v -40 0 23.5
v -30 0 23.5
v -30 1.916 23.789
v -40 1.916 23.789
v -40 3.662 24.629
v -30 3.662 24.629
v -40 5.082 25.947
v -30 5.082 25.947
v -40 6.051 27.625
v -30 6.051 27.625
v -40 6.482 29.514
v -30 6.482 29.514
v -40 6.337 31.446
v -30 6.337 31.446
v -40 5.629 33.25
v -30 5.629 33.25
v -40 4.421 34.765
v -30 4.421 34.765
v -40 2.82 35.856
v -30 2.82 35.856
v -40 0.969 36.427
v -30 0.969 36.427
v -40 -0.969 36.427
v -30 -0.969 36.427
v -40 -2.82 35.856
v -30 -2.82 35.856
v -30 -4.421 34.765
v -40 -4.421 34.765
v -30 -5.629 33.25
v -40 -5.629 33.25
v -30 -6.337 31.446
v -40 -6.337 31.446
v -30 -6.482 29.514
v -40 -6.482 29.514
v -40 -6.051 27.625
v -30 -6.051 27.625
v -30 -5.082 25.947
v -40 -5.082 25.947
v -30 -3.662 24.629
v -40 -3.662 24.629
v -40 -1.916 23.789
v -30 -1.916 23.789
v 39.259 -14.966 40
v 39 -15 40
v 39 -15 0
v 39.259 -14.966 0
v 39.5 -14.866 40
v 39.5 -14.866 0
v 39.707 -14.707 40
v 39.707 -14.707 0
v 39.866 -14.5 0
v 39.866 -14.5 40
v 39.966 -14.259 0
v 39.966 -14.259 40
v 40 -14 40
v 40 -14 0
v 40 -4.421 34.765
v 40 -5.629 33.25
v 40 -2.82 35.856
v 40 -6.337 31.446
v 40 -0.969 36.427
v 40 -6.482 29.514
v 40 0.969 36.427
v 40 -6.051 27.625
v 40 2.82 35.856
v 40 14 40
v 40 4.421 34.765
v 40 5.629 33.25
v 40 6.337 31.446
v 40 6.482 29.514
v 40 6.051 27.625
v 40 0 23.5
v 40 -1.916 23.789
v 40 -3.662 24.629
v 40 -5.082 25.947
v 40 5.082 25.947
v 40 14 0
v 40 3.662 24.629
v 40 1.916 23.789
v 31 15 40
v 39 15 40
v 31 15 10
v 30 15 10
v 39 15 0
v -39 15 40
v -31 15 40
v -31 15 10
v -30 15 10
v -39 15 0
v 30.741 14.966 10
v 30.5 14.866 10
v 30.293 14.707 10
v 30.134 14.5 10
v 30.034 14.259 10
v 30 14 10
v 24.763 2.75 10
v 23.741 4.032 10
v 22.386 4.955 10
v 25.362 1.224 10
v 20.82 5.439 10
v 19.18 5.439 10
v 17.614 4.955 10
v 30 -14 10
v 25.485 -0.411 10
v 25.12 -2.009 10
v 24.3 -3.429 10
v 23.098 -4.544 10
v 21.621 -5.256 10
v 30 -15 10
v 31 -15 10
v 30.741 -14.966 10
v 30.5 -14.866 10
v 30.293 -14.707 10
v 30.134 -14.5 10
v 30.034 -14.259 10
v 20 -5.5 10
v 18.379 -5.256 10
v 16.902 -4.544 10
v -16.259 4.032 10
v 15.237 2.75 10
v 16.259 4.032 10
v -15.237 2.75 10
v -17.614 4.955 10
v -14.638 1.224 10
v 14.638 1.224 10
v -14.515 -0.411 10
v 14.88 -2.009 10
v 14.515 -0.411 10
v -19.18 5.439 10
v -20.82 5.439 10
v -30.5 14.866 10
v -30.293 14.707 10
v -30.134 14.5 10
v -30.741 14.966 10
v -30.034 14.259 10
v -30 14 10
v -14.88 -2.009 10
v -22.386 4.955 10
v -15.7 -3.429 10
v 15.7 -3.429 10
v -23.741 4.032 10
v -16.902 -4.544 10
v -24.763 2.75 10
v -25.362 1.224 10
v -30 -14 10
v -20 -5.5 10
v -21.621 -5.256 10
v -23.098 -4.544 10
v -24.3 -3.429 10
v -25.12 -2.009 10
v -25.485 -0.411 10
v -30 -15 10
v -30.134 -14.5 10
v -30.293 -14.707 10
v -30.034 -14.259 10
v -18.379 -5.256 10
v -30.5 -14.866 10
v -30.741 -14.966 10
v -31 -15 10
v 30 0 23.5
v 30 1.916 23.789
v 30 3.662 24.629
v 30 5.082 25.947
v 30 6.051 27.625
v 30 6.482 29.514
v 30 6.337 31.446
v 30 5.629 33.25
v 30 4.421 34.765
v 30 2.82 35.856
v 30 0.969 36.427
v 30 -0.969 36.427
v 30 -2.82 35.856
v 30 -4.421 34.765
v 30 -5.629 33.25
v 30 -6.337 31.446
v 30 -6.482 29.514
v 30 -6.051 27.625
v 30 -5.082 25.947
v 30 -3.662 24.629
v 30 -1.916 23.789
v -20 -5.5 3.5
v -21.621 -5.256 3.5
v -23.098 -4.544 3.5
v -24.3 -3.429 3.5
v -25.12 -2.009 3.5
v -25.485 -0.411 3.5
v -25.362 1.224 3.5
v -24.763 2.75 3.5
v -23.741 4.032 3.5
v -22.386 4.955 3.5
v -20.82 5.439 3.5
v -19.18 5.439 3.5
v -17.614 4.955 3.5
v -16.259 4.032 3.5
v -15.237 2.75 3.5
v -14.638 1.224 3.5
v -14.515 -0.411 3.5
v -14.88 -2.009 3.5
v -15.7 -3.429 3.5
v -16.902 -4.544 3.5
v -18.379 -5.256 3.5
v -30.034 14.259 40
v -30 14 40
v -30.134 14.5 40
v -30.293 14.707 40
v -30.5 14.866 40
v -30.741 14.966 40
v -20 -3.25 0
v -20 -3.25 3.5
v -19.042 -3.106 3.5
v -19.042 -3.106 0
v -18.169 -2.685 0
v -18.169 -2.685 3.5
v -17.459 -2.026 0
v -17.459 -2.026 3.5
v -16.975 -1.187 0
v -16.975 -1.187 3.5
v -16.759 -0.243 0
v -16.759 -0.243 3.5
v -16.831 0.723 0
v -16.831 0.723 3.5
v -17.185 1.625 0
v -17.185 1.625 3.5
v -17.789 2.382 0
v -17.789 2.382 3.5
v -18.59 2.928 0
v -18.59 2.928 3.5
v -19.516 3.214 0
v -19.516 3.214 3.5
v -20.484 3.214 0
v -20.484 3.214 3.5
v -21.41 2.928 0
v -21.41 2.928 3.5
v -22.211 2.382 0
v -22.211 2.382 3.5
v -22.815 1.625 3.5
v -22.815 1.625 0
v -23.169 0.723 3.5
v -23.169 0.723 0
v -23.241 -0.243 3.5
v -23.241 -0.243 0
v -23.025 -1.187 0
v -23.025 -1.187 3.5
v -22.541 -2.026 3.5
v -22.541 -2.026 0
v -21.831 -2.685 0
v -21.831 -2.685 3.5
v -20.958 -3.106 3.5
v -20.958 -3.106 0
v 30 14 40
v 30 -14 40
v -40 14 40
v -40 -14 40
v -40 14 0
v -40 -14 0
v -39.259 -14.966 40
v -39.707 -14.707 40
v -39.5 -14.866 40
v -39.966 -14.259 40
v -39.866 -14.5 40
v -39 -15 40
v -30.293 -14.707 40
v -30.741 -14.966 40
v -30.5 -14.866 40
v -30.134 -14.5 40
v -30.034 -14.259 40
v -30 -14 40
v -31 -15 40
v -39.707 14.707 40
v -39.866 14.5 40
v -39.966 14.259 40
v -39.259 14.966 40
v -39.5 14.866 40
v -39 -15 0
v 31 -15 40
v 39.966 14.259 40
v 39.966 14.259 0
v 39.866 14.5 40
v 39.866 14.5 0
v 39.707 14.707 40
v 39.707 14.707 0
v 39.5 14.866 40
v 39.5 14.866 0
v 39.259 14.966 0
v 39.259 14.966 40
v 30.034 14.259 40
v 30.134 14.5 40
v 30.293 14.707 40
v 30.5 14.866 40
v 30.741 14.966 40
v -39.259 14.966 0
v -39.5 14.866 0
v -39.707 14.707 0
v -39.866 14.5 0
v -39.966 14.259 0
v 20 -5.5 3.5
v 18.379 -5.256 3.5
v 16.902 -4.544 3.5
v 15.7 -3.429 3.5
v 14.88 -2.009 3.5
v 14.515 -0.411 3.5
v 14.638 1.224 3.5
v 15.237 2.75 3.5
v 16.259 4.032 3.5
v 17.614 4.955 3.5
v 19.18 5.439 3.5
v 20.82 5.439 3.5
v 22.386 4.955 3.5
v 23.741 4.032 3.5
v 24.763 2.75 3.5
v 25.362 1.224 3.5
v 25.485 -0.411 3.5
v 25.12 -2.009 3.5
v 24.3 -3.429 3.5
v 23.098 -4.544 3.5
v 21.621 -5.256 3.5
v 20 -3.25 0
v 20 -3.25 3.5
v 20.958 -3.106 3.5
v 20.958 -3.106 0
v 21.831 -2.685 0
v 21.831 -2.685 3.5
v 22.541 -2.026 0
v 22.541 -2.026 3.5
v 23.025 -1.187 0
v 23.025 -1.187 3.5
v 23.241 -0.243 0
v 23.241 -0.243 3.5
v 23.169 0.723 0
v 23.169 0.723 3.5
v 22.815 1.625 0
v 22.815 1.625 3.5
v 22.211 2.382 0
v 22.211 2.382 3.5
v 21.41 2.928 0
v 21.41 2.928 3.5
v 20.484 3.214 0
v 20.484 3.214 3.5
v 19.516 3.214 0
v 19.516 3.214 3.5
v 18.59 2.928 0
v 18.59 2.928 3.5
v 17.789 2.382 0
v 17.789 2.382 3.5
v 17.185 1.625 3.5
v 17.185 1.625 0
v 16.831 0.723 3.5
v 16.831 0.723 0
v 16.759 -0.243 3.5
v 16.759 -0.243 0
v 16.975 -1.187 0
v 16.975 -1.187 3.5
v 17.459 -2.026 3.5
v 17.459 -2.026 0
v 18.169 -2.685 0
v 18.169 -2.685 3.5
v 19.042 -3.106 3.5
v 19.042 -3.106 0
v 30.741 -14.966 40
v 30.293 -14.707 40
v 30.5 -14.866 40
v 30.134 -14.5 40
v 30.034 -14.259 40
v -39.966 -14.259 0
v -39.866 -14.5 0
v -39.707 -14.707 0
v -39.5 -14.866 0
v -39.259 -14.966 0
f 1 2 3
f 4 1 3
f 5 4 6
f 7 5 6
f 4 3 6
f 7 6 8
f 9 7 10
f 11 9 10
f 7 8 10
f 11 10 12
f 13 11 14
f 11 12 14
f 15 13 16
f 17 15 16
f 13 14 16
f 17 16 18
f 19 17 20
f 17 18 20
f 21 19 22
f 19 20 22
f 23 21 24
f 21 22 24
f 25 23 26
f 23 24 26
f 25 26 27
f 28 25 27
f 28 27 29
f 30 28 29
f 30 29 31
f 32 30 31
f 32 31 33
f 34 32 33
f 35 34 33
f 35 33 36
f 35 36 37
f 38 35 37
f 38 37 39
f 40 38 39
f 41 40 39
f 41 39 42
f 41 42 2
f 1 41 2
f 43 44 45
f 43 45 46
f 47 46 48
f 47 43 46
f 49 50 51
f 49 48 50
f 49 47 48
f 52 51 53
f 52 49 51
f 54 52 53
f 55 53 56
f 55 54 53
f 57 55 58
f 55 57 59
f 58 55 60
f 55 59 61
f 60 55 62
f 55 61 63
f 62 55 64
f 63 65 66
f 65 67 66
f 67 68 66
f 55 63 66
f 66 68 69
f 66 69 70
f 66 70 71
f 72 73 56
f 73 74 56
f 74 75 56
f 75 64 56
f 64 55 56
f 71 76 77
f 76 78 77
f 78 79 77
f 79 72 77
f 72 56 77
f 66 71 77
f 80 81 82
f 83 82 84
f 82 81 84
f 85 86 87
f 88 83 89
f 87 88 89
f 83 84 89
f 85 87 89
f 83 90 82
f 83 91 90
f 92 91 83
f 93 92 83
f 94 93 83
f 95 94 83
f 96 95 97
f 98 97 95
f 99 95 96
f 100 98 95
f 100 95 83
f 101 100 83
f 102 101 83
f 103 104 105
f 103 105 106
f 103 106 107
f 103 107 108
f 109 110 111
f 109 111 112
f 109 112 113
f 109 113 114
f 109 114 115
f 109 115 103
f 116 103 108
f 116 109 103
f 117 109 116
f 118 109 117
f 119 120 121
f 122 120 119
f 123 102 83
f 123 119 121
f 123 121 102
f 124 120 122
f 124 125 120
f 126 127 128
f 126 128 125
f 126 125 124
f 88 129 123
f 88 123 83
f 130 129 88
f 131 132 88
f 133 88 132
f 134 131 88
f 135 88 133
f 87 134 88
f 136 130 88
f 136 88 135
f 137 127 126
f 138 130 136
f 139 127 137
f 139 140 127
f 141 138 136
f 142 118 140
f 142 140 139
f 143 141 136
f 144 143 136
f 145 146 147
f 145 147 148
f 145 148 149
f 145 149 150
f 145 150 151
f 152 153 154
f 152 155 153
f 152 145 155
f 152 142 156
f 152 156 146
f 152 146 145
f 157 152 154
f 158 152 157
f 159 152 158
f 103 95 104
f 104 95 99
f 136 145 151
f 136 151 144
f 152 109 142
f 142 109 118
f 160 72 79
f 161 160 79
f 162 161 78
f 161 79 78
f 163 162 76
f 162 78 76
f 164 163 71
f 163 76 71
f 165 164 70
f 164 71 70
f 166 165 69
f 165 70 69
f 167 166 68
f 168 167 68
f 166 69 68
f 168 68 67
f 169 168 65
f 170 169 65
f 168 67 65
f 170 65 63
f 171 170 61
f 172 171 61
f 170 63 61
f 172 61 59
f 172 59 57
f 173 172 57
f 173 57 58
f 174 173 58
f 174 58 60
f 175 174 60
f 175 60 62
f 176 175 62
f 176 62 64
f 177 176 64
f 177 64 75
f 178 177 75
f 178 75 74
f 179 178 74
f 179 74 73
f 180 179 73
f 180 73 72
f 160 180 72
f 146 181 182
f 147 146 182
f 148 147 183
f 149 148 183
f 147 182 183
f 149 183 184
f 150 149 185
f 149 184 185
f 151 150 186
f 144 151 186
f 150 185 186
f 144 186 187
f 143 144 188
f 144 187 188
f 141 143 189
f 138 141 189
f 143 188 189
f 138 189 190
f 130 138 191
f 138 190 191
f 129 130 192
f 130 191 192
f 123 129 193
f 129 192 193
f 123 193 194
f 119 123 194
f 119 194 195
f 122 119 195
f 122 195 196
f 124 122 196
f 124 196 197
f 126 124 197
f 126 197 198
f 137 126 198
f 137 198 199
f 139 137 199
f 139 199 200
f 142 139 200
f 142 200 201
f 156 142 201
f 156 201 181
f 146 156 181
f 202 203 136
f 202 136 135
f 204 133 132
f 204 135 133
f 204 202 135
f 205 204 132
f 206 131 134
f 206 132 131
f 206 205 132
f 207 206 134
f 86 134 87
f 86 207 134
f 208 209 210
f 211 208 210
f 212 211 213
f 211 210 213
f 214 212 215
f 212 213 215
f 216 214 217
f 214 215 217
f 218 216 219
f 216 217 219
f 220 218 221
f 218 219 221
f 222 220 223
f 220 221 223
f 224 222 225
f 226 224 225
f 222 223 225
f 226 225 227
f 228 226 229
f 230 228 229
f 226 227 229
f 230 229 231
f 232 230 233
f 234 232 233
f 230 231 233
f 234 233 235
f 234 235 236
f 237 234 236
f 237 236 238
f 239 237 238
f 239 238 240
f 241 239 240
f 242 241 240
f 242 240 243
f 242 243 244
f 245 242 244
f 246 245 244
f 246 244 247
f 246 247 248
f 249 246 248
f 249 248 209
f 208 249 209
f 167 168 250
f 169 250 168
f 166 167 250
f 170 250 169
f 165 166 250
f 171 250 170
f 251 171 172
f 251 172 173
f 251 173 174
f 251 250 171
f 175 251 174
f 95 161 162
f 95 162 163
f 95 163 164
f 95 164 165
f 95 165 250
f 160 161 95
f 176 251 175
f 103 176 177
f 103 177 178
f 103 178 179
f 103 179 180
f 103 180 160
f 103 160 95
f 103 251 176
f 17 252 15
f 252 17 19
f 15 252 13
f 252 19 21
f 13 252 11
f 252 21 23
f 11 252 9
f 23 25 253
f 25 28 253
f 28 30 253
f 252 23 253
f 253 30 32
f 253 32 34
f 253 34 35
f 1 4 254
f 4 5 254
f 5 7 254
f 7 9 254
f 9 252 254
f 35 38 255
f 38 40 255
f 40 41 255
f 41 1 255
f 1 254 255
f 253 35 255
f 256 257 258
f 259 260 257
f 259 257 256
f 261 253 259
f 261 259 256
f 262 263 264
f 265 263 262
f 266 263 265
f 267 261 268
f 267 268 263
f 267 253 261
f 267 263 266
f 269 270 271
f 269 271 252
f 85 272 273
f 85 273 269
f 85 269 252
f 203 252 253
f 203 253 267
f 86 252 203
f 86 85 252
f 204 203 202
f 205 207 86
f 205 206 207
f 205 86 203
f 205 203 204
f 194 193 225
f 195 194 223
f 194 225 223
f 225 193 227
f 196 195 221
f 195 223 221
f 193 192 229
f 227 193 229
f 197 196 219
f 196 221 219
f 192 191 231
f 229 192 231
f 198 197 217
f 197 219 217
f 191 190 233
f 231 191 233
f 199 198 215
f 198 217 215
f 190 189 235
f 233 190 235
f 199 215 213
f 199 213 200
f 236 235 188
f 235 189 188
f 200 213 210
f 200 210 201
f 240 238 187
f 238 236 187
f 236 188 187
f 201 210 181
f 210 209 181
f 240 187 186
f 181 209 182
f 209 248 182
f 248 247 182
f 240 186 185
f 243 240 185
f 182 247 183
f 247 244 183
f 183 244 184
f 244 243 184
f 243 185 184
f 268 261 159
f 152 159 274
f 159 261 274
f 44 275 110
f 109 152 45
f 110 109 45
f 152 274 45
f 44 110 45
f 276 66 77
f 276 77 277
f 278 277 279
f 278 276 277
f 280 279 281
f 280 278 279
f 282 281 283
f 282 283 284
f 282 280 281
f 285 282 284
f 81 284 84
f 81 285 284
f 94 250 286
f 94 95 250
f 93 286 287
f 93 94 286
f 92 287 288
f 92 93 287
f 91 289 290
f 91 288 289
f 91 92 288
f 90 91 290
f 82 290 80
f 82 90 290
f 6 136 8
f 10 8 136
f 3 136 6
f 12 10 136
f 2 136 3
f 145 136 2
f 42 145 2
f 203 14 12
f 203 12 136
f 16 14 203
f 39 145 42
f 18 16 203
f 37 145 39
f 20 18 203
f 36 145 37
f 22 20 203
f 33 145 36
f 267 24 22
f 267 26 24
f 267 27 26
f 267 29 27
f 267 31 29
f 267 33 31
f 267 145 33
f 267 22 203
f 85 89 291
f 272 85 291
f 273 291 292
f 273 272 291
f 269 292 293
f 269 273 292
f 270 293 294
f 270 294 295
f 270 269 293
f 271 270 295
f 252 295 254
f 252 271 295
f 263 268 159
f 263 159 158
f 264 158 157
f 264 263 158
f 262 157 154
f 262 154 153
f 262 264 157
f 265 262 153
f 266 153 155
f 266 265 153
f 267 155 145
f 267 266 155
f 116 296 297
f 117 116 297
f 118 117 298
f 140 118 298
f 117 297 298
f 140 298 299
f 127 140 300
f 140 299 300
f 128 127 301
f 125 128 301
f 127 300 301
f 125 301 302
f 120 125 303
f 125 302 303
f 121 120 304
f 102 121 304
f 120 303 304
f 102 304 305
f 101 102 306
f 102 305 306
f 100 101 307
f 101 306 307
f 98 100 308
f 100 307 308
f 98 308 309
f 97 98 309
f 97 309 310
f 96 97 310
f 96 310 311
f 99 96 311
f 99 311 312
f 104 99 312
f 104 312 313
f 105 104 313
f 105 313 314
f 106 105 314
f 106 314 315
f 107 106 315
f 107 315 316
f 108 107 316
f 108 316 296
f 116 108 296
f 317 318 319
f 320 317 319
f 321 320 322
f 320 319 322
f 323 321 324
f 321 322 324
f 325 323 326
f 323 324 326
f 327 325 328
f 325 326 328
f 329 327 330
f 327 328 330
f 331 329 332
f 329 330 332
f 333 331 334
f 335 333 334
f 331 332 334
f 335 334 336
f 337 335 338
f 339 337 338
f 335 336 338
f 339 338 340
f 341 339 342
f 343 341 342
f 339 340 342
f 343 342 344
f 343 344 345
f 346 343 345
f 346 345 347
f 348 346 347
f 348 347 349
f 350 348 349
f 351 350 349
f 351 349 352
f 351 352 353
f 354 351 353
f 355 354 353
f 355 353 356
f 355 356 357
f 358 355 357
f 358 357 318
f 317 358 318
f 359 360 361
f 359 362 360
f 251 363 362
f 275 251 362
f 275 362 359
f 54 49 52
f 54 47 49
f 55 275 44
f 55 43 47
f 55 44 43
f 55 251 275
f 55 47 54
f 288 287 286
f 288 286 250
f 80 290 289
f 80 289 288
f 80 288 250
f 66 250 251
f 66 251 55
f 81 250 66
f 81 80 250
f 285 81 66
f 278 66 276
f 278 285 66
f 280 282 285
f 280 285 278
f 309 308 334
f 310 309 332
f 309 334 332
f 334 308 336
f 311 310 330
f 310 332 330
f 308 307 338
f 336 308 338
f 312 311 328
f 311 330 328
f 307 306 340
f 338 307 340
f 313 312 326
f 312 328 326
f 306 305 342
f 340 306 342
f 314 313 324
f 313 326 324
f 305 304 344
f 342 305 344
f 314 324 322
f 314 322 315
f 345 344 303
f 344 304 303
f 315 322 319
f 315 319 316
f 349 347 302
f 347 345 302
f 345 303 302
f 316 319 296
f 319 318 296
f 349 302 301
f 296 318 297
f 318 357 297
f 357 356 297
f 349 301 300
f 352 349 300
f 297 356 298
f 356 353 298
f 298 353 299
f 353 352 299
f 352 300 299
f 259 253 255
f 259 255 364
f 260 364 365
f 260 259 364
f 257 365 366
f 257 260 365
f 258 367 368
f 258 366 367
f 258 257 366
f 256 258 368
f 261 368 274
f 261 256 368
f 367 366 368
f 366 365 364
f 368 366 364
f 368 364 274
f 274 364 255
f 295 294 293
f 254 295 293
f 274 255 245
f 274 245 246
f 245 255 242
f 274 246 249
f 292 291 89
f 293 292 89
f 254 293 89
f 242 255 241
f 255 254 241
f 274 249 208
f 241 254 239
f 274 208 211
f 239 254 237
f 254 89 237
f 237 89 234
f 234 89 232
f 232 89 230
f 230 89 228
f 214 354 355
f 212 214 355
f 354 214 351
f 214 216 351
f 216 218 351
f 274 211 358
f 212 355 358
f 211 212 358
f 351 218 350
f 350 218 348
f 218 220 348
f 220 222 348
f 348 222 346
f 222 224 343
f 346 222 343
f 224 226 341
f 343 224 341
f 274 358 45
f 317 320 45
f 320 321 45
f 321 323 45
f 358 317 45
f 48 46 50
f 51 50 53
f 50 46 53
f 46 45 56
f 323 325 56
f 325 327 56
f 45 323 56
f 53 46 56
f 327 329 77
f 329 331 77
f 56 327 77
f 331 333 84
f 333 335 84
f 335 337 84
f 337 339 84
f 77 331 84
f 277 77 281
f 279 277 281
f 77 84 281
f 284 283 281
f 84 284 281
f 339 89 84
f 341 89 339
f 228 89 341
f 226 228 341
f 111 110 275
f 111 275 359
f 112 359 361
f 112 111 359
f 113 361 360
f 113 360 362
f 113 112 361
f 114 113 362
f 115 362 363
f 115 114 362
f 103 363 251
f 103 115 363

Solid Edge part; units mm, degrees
sketch "Sketch1" plane through (0, 0, 0) normal (0, 0, 1) x (1, 0, 0)
  line L0 (40, -15) -> (40, 15)
  line L1 (40, 15) -> (-40, 15)
  line L2 (-40, 15) -> (-40, -15)
  line L3 (-40, -15) -> (40, -15)
extrude "Protrusion1" add sketch "Sketch1" along normal blind 40
sketch "Sketch2" plane through (0, -15, 20) normal (0, -1, 0) x (1, 0, 0)
  line L0 (-30, -10) -> (-30, 20)
  line L1 (-30, 20) -> (30, 20)
  line L2 (30, 20) -> (30, -10)
  line L3 (30, -10) -> (-30, -10)
extrude "Cutout1" cut sketch "Sketch2" against normal through all
hole "Bohrung_6" at (-20, 0, 10) direction (0, 0, -1) diameter 6.5 end up to next counterbore diameter 11 counterbore depth 6.5
hole "Hole1" at (20, 0, 10) direction (0, 0, -1) diameter 6.5 end up to next counterbore diameter 11 counterbore depth 6.5
hole "Bohrung_8" at (40, 0, 30) direction (-1, 0, 0) diameter 13 end through all
fillet "Verrundung_2" radius 1 8 edges at (-40, -15, 20) (-30, -15, 25) (-30, 15, 25) (-40, 15, 20) (40, -15, 20) (40, 15, 20) (30, -15, 25) (30, 15, 25)
